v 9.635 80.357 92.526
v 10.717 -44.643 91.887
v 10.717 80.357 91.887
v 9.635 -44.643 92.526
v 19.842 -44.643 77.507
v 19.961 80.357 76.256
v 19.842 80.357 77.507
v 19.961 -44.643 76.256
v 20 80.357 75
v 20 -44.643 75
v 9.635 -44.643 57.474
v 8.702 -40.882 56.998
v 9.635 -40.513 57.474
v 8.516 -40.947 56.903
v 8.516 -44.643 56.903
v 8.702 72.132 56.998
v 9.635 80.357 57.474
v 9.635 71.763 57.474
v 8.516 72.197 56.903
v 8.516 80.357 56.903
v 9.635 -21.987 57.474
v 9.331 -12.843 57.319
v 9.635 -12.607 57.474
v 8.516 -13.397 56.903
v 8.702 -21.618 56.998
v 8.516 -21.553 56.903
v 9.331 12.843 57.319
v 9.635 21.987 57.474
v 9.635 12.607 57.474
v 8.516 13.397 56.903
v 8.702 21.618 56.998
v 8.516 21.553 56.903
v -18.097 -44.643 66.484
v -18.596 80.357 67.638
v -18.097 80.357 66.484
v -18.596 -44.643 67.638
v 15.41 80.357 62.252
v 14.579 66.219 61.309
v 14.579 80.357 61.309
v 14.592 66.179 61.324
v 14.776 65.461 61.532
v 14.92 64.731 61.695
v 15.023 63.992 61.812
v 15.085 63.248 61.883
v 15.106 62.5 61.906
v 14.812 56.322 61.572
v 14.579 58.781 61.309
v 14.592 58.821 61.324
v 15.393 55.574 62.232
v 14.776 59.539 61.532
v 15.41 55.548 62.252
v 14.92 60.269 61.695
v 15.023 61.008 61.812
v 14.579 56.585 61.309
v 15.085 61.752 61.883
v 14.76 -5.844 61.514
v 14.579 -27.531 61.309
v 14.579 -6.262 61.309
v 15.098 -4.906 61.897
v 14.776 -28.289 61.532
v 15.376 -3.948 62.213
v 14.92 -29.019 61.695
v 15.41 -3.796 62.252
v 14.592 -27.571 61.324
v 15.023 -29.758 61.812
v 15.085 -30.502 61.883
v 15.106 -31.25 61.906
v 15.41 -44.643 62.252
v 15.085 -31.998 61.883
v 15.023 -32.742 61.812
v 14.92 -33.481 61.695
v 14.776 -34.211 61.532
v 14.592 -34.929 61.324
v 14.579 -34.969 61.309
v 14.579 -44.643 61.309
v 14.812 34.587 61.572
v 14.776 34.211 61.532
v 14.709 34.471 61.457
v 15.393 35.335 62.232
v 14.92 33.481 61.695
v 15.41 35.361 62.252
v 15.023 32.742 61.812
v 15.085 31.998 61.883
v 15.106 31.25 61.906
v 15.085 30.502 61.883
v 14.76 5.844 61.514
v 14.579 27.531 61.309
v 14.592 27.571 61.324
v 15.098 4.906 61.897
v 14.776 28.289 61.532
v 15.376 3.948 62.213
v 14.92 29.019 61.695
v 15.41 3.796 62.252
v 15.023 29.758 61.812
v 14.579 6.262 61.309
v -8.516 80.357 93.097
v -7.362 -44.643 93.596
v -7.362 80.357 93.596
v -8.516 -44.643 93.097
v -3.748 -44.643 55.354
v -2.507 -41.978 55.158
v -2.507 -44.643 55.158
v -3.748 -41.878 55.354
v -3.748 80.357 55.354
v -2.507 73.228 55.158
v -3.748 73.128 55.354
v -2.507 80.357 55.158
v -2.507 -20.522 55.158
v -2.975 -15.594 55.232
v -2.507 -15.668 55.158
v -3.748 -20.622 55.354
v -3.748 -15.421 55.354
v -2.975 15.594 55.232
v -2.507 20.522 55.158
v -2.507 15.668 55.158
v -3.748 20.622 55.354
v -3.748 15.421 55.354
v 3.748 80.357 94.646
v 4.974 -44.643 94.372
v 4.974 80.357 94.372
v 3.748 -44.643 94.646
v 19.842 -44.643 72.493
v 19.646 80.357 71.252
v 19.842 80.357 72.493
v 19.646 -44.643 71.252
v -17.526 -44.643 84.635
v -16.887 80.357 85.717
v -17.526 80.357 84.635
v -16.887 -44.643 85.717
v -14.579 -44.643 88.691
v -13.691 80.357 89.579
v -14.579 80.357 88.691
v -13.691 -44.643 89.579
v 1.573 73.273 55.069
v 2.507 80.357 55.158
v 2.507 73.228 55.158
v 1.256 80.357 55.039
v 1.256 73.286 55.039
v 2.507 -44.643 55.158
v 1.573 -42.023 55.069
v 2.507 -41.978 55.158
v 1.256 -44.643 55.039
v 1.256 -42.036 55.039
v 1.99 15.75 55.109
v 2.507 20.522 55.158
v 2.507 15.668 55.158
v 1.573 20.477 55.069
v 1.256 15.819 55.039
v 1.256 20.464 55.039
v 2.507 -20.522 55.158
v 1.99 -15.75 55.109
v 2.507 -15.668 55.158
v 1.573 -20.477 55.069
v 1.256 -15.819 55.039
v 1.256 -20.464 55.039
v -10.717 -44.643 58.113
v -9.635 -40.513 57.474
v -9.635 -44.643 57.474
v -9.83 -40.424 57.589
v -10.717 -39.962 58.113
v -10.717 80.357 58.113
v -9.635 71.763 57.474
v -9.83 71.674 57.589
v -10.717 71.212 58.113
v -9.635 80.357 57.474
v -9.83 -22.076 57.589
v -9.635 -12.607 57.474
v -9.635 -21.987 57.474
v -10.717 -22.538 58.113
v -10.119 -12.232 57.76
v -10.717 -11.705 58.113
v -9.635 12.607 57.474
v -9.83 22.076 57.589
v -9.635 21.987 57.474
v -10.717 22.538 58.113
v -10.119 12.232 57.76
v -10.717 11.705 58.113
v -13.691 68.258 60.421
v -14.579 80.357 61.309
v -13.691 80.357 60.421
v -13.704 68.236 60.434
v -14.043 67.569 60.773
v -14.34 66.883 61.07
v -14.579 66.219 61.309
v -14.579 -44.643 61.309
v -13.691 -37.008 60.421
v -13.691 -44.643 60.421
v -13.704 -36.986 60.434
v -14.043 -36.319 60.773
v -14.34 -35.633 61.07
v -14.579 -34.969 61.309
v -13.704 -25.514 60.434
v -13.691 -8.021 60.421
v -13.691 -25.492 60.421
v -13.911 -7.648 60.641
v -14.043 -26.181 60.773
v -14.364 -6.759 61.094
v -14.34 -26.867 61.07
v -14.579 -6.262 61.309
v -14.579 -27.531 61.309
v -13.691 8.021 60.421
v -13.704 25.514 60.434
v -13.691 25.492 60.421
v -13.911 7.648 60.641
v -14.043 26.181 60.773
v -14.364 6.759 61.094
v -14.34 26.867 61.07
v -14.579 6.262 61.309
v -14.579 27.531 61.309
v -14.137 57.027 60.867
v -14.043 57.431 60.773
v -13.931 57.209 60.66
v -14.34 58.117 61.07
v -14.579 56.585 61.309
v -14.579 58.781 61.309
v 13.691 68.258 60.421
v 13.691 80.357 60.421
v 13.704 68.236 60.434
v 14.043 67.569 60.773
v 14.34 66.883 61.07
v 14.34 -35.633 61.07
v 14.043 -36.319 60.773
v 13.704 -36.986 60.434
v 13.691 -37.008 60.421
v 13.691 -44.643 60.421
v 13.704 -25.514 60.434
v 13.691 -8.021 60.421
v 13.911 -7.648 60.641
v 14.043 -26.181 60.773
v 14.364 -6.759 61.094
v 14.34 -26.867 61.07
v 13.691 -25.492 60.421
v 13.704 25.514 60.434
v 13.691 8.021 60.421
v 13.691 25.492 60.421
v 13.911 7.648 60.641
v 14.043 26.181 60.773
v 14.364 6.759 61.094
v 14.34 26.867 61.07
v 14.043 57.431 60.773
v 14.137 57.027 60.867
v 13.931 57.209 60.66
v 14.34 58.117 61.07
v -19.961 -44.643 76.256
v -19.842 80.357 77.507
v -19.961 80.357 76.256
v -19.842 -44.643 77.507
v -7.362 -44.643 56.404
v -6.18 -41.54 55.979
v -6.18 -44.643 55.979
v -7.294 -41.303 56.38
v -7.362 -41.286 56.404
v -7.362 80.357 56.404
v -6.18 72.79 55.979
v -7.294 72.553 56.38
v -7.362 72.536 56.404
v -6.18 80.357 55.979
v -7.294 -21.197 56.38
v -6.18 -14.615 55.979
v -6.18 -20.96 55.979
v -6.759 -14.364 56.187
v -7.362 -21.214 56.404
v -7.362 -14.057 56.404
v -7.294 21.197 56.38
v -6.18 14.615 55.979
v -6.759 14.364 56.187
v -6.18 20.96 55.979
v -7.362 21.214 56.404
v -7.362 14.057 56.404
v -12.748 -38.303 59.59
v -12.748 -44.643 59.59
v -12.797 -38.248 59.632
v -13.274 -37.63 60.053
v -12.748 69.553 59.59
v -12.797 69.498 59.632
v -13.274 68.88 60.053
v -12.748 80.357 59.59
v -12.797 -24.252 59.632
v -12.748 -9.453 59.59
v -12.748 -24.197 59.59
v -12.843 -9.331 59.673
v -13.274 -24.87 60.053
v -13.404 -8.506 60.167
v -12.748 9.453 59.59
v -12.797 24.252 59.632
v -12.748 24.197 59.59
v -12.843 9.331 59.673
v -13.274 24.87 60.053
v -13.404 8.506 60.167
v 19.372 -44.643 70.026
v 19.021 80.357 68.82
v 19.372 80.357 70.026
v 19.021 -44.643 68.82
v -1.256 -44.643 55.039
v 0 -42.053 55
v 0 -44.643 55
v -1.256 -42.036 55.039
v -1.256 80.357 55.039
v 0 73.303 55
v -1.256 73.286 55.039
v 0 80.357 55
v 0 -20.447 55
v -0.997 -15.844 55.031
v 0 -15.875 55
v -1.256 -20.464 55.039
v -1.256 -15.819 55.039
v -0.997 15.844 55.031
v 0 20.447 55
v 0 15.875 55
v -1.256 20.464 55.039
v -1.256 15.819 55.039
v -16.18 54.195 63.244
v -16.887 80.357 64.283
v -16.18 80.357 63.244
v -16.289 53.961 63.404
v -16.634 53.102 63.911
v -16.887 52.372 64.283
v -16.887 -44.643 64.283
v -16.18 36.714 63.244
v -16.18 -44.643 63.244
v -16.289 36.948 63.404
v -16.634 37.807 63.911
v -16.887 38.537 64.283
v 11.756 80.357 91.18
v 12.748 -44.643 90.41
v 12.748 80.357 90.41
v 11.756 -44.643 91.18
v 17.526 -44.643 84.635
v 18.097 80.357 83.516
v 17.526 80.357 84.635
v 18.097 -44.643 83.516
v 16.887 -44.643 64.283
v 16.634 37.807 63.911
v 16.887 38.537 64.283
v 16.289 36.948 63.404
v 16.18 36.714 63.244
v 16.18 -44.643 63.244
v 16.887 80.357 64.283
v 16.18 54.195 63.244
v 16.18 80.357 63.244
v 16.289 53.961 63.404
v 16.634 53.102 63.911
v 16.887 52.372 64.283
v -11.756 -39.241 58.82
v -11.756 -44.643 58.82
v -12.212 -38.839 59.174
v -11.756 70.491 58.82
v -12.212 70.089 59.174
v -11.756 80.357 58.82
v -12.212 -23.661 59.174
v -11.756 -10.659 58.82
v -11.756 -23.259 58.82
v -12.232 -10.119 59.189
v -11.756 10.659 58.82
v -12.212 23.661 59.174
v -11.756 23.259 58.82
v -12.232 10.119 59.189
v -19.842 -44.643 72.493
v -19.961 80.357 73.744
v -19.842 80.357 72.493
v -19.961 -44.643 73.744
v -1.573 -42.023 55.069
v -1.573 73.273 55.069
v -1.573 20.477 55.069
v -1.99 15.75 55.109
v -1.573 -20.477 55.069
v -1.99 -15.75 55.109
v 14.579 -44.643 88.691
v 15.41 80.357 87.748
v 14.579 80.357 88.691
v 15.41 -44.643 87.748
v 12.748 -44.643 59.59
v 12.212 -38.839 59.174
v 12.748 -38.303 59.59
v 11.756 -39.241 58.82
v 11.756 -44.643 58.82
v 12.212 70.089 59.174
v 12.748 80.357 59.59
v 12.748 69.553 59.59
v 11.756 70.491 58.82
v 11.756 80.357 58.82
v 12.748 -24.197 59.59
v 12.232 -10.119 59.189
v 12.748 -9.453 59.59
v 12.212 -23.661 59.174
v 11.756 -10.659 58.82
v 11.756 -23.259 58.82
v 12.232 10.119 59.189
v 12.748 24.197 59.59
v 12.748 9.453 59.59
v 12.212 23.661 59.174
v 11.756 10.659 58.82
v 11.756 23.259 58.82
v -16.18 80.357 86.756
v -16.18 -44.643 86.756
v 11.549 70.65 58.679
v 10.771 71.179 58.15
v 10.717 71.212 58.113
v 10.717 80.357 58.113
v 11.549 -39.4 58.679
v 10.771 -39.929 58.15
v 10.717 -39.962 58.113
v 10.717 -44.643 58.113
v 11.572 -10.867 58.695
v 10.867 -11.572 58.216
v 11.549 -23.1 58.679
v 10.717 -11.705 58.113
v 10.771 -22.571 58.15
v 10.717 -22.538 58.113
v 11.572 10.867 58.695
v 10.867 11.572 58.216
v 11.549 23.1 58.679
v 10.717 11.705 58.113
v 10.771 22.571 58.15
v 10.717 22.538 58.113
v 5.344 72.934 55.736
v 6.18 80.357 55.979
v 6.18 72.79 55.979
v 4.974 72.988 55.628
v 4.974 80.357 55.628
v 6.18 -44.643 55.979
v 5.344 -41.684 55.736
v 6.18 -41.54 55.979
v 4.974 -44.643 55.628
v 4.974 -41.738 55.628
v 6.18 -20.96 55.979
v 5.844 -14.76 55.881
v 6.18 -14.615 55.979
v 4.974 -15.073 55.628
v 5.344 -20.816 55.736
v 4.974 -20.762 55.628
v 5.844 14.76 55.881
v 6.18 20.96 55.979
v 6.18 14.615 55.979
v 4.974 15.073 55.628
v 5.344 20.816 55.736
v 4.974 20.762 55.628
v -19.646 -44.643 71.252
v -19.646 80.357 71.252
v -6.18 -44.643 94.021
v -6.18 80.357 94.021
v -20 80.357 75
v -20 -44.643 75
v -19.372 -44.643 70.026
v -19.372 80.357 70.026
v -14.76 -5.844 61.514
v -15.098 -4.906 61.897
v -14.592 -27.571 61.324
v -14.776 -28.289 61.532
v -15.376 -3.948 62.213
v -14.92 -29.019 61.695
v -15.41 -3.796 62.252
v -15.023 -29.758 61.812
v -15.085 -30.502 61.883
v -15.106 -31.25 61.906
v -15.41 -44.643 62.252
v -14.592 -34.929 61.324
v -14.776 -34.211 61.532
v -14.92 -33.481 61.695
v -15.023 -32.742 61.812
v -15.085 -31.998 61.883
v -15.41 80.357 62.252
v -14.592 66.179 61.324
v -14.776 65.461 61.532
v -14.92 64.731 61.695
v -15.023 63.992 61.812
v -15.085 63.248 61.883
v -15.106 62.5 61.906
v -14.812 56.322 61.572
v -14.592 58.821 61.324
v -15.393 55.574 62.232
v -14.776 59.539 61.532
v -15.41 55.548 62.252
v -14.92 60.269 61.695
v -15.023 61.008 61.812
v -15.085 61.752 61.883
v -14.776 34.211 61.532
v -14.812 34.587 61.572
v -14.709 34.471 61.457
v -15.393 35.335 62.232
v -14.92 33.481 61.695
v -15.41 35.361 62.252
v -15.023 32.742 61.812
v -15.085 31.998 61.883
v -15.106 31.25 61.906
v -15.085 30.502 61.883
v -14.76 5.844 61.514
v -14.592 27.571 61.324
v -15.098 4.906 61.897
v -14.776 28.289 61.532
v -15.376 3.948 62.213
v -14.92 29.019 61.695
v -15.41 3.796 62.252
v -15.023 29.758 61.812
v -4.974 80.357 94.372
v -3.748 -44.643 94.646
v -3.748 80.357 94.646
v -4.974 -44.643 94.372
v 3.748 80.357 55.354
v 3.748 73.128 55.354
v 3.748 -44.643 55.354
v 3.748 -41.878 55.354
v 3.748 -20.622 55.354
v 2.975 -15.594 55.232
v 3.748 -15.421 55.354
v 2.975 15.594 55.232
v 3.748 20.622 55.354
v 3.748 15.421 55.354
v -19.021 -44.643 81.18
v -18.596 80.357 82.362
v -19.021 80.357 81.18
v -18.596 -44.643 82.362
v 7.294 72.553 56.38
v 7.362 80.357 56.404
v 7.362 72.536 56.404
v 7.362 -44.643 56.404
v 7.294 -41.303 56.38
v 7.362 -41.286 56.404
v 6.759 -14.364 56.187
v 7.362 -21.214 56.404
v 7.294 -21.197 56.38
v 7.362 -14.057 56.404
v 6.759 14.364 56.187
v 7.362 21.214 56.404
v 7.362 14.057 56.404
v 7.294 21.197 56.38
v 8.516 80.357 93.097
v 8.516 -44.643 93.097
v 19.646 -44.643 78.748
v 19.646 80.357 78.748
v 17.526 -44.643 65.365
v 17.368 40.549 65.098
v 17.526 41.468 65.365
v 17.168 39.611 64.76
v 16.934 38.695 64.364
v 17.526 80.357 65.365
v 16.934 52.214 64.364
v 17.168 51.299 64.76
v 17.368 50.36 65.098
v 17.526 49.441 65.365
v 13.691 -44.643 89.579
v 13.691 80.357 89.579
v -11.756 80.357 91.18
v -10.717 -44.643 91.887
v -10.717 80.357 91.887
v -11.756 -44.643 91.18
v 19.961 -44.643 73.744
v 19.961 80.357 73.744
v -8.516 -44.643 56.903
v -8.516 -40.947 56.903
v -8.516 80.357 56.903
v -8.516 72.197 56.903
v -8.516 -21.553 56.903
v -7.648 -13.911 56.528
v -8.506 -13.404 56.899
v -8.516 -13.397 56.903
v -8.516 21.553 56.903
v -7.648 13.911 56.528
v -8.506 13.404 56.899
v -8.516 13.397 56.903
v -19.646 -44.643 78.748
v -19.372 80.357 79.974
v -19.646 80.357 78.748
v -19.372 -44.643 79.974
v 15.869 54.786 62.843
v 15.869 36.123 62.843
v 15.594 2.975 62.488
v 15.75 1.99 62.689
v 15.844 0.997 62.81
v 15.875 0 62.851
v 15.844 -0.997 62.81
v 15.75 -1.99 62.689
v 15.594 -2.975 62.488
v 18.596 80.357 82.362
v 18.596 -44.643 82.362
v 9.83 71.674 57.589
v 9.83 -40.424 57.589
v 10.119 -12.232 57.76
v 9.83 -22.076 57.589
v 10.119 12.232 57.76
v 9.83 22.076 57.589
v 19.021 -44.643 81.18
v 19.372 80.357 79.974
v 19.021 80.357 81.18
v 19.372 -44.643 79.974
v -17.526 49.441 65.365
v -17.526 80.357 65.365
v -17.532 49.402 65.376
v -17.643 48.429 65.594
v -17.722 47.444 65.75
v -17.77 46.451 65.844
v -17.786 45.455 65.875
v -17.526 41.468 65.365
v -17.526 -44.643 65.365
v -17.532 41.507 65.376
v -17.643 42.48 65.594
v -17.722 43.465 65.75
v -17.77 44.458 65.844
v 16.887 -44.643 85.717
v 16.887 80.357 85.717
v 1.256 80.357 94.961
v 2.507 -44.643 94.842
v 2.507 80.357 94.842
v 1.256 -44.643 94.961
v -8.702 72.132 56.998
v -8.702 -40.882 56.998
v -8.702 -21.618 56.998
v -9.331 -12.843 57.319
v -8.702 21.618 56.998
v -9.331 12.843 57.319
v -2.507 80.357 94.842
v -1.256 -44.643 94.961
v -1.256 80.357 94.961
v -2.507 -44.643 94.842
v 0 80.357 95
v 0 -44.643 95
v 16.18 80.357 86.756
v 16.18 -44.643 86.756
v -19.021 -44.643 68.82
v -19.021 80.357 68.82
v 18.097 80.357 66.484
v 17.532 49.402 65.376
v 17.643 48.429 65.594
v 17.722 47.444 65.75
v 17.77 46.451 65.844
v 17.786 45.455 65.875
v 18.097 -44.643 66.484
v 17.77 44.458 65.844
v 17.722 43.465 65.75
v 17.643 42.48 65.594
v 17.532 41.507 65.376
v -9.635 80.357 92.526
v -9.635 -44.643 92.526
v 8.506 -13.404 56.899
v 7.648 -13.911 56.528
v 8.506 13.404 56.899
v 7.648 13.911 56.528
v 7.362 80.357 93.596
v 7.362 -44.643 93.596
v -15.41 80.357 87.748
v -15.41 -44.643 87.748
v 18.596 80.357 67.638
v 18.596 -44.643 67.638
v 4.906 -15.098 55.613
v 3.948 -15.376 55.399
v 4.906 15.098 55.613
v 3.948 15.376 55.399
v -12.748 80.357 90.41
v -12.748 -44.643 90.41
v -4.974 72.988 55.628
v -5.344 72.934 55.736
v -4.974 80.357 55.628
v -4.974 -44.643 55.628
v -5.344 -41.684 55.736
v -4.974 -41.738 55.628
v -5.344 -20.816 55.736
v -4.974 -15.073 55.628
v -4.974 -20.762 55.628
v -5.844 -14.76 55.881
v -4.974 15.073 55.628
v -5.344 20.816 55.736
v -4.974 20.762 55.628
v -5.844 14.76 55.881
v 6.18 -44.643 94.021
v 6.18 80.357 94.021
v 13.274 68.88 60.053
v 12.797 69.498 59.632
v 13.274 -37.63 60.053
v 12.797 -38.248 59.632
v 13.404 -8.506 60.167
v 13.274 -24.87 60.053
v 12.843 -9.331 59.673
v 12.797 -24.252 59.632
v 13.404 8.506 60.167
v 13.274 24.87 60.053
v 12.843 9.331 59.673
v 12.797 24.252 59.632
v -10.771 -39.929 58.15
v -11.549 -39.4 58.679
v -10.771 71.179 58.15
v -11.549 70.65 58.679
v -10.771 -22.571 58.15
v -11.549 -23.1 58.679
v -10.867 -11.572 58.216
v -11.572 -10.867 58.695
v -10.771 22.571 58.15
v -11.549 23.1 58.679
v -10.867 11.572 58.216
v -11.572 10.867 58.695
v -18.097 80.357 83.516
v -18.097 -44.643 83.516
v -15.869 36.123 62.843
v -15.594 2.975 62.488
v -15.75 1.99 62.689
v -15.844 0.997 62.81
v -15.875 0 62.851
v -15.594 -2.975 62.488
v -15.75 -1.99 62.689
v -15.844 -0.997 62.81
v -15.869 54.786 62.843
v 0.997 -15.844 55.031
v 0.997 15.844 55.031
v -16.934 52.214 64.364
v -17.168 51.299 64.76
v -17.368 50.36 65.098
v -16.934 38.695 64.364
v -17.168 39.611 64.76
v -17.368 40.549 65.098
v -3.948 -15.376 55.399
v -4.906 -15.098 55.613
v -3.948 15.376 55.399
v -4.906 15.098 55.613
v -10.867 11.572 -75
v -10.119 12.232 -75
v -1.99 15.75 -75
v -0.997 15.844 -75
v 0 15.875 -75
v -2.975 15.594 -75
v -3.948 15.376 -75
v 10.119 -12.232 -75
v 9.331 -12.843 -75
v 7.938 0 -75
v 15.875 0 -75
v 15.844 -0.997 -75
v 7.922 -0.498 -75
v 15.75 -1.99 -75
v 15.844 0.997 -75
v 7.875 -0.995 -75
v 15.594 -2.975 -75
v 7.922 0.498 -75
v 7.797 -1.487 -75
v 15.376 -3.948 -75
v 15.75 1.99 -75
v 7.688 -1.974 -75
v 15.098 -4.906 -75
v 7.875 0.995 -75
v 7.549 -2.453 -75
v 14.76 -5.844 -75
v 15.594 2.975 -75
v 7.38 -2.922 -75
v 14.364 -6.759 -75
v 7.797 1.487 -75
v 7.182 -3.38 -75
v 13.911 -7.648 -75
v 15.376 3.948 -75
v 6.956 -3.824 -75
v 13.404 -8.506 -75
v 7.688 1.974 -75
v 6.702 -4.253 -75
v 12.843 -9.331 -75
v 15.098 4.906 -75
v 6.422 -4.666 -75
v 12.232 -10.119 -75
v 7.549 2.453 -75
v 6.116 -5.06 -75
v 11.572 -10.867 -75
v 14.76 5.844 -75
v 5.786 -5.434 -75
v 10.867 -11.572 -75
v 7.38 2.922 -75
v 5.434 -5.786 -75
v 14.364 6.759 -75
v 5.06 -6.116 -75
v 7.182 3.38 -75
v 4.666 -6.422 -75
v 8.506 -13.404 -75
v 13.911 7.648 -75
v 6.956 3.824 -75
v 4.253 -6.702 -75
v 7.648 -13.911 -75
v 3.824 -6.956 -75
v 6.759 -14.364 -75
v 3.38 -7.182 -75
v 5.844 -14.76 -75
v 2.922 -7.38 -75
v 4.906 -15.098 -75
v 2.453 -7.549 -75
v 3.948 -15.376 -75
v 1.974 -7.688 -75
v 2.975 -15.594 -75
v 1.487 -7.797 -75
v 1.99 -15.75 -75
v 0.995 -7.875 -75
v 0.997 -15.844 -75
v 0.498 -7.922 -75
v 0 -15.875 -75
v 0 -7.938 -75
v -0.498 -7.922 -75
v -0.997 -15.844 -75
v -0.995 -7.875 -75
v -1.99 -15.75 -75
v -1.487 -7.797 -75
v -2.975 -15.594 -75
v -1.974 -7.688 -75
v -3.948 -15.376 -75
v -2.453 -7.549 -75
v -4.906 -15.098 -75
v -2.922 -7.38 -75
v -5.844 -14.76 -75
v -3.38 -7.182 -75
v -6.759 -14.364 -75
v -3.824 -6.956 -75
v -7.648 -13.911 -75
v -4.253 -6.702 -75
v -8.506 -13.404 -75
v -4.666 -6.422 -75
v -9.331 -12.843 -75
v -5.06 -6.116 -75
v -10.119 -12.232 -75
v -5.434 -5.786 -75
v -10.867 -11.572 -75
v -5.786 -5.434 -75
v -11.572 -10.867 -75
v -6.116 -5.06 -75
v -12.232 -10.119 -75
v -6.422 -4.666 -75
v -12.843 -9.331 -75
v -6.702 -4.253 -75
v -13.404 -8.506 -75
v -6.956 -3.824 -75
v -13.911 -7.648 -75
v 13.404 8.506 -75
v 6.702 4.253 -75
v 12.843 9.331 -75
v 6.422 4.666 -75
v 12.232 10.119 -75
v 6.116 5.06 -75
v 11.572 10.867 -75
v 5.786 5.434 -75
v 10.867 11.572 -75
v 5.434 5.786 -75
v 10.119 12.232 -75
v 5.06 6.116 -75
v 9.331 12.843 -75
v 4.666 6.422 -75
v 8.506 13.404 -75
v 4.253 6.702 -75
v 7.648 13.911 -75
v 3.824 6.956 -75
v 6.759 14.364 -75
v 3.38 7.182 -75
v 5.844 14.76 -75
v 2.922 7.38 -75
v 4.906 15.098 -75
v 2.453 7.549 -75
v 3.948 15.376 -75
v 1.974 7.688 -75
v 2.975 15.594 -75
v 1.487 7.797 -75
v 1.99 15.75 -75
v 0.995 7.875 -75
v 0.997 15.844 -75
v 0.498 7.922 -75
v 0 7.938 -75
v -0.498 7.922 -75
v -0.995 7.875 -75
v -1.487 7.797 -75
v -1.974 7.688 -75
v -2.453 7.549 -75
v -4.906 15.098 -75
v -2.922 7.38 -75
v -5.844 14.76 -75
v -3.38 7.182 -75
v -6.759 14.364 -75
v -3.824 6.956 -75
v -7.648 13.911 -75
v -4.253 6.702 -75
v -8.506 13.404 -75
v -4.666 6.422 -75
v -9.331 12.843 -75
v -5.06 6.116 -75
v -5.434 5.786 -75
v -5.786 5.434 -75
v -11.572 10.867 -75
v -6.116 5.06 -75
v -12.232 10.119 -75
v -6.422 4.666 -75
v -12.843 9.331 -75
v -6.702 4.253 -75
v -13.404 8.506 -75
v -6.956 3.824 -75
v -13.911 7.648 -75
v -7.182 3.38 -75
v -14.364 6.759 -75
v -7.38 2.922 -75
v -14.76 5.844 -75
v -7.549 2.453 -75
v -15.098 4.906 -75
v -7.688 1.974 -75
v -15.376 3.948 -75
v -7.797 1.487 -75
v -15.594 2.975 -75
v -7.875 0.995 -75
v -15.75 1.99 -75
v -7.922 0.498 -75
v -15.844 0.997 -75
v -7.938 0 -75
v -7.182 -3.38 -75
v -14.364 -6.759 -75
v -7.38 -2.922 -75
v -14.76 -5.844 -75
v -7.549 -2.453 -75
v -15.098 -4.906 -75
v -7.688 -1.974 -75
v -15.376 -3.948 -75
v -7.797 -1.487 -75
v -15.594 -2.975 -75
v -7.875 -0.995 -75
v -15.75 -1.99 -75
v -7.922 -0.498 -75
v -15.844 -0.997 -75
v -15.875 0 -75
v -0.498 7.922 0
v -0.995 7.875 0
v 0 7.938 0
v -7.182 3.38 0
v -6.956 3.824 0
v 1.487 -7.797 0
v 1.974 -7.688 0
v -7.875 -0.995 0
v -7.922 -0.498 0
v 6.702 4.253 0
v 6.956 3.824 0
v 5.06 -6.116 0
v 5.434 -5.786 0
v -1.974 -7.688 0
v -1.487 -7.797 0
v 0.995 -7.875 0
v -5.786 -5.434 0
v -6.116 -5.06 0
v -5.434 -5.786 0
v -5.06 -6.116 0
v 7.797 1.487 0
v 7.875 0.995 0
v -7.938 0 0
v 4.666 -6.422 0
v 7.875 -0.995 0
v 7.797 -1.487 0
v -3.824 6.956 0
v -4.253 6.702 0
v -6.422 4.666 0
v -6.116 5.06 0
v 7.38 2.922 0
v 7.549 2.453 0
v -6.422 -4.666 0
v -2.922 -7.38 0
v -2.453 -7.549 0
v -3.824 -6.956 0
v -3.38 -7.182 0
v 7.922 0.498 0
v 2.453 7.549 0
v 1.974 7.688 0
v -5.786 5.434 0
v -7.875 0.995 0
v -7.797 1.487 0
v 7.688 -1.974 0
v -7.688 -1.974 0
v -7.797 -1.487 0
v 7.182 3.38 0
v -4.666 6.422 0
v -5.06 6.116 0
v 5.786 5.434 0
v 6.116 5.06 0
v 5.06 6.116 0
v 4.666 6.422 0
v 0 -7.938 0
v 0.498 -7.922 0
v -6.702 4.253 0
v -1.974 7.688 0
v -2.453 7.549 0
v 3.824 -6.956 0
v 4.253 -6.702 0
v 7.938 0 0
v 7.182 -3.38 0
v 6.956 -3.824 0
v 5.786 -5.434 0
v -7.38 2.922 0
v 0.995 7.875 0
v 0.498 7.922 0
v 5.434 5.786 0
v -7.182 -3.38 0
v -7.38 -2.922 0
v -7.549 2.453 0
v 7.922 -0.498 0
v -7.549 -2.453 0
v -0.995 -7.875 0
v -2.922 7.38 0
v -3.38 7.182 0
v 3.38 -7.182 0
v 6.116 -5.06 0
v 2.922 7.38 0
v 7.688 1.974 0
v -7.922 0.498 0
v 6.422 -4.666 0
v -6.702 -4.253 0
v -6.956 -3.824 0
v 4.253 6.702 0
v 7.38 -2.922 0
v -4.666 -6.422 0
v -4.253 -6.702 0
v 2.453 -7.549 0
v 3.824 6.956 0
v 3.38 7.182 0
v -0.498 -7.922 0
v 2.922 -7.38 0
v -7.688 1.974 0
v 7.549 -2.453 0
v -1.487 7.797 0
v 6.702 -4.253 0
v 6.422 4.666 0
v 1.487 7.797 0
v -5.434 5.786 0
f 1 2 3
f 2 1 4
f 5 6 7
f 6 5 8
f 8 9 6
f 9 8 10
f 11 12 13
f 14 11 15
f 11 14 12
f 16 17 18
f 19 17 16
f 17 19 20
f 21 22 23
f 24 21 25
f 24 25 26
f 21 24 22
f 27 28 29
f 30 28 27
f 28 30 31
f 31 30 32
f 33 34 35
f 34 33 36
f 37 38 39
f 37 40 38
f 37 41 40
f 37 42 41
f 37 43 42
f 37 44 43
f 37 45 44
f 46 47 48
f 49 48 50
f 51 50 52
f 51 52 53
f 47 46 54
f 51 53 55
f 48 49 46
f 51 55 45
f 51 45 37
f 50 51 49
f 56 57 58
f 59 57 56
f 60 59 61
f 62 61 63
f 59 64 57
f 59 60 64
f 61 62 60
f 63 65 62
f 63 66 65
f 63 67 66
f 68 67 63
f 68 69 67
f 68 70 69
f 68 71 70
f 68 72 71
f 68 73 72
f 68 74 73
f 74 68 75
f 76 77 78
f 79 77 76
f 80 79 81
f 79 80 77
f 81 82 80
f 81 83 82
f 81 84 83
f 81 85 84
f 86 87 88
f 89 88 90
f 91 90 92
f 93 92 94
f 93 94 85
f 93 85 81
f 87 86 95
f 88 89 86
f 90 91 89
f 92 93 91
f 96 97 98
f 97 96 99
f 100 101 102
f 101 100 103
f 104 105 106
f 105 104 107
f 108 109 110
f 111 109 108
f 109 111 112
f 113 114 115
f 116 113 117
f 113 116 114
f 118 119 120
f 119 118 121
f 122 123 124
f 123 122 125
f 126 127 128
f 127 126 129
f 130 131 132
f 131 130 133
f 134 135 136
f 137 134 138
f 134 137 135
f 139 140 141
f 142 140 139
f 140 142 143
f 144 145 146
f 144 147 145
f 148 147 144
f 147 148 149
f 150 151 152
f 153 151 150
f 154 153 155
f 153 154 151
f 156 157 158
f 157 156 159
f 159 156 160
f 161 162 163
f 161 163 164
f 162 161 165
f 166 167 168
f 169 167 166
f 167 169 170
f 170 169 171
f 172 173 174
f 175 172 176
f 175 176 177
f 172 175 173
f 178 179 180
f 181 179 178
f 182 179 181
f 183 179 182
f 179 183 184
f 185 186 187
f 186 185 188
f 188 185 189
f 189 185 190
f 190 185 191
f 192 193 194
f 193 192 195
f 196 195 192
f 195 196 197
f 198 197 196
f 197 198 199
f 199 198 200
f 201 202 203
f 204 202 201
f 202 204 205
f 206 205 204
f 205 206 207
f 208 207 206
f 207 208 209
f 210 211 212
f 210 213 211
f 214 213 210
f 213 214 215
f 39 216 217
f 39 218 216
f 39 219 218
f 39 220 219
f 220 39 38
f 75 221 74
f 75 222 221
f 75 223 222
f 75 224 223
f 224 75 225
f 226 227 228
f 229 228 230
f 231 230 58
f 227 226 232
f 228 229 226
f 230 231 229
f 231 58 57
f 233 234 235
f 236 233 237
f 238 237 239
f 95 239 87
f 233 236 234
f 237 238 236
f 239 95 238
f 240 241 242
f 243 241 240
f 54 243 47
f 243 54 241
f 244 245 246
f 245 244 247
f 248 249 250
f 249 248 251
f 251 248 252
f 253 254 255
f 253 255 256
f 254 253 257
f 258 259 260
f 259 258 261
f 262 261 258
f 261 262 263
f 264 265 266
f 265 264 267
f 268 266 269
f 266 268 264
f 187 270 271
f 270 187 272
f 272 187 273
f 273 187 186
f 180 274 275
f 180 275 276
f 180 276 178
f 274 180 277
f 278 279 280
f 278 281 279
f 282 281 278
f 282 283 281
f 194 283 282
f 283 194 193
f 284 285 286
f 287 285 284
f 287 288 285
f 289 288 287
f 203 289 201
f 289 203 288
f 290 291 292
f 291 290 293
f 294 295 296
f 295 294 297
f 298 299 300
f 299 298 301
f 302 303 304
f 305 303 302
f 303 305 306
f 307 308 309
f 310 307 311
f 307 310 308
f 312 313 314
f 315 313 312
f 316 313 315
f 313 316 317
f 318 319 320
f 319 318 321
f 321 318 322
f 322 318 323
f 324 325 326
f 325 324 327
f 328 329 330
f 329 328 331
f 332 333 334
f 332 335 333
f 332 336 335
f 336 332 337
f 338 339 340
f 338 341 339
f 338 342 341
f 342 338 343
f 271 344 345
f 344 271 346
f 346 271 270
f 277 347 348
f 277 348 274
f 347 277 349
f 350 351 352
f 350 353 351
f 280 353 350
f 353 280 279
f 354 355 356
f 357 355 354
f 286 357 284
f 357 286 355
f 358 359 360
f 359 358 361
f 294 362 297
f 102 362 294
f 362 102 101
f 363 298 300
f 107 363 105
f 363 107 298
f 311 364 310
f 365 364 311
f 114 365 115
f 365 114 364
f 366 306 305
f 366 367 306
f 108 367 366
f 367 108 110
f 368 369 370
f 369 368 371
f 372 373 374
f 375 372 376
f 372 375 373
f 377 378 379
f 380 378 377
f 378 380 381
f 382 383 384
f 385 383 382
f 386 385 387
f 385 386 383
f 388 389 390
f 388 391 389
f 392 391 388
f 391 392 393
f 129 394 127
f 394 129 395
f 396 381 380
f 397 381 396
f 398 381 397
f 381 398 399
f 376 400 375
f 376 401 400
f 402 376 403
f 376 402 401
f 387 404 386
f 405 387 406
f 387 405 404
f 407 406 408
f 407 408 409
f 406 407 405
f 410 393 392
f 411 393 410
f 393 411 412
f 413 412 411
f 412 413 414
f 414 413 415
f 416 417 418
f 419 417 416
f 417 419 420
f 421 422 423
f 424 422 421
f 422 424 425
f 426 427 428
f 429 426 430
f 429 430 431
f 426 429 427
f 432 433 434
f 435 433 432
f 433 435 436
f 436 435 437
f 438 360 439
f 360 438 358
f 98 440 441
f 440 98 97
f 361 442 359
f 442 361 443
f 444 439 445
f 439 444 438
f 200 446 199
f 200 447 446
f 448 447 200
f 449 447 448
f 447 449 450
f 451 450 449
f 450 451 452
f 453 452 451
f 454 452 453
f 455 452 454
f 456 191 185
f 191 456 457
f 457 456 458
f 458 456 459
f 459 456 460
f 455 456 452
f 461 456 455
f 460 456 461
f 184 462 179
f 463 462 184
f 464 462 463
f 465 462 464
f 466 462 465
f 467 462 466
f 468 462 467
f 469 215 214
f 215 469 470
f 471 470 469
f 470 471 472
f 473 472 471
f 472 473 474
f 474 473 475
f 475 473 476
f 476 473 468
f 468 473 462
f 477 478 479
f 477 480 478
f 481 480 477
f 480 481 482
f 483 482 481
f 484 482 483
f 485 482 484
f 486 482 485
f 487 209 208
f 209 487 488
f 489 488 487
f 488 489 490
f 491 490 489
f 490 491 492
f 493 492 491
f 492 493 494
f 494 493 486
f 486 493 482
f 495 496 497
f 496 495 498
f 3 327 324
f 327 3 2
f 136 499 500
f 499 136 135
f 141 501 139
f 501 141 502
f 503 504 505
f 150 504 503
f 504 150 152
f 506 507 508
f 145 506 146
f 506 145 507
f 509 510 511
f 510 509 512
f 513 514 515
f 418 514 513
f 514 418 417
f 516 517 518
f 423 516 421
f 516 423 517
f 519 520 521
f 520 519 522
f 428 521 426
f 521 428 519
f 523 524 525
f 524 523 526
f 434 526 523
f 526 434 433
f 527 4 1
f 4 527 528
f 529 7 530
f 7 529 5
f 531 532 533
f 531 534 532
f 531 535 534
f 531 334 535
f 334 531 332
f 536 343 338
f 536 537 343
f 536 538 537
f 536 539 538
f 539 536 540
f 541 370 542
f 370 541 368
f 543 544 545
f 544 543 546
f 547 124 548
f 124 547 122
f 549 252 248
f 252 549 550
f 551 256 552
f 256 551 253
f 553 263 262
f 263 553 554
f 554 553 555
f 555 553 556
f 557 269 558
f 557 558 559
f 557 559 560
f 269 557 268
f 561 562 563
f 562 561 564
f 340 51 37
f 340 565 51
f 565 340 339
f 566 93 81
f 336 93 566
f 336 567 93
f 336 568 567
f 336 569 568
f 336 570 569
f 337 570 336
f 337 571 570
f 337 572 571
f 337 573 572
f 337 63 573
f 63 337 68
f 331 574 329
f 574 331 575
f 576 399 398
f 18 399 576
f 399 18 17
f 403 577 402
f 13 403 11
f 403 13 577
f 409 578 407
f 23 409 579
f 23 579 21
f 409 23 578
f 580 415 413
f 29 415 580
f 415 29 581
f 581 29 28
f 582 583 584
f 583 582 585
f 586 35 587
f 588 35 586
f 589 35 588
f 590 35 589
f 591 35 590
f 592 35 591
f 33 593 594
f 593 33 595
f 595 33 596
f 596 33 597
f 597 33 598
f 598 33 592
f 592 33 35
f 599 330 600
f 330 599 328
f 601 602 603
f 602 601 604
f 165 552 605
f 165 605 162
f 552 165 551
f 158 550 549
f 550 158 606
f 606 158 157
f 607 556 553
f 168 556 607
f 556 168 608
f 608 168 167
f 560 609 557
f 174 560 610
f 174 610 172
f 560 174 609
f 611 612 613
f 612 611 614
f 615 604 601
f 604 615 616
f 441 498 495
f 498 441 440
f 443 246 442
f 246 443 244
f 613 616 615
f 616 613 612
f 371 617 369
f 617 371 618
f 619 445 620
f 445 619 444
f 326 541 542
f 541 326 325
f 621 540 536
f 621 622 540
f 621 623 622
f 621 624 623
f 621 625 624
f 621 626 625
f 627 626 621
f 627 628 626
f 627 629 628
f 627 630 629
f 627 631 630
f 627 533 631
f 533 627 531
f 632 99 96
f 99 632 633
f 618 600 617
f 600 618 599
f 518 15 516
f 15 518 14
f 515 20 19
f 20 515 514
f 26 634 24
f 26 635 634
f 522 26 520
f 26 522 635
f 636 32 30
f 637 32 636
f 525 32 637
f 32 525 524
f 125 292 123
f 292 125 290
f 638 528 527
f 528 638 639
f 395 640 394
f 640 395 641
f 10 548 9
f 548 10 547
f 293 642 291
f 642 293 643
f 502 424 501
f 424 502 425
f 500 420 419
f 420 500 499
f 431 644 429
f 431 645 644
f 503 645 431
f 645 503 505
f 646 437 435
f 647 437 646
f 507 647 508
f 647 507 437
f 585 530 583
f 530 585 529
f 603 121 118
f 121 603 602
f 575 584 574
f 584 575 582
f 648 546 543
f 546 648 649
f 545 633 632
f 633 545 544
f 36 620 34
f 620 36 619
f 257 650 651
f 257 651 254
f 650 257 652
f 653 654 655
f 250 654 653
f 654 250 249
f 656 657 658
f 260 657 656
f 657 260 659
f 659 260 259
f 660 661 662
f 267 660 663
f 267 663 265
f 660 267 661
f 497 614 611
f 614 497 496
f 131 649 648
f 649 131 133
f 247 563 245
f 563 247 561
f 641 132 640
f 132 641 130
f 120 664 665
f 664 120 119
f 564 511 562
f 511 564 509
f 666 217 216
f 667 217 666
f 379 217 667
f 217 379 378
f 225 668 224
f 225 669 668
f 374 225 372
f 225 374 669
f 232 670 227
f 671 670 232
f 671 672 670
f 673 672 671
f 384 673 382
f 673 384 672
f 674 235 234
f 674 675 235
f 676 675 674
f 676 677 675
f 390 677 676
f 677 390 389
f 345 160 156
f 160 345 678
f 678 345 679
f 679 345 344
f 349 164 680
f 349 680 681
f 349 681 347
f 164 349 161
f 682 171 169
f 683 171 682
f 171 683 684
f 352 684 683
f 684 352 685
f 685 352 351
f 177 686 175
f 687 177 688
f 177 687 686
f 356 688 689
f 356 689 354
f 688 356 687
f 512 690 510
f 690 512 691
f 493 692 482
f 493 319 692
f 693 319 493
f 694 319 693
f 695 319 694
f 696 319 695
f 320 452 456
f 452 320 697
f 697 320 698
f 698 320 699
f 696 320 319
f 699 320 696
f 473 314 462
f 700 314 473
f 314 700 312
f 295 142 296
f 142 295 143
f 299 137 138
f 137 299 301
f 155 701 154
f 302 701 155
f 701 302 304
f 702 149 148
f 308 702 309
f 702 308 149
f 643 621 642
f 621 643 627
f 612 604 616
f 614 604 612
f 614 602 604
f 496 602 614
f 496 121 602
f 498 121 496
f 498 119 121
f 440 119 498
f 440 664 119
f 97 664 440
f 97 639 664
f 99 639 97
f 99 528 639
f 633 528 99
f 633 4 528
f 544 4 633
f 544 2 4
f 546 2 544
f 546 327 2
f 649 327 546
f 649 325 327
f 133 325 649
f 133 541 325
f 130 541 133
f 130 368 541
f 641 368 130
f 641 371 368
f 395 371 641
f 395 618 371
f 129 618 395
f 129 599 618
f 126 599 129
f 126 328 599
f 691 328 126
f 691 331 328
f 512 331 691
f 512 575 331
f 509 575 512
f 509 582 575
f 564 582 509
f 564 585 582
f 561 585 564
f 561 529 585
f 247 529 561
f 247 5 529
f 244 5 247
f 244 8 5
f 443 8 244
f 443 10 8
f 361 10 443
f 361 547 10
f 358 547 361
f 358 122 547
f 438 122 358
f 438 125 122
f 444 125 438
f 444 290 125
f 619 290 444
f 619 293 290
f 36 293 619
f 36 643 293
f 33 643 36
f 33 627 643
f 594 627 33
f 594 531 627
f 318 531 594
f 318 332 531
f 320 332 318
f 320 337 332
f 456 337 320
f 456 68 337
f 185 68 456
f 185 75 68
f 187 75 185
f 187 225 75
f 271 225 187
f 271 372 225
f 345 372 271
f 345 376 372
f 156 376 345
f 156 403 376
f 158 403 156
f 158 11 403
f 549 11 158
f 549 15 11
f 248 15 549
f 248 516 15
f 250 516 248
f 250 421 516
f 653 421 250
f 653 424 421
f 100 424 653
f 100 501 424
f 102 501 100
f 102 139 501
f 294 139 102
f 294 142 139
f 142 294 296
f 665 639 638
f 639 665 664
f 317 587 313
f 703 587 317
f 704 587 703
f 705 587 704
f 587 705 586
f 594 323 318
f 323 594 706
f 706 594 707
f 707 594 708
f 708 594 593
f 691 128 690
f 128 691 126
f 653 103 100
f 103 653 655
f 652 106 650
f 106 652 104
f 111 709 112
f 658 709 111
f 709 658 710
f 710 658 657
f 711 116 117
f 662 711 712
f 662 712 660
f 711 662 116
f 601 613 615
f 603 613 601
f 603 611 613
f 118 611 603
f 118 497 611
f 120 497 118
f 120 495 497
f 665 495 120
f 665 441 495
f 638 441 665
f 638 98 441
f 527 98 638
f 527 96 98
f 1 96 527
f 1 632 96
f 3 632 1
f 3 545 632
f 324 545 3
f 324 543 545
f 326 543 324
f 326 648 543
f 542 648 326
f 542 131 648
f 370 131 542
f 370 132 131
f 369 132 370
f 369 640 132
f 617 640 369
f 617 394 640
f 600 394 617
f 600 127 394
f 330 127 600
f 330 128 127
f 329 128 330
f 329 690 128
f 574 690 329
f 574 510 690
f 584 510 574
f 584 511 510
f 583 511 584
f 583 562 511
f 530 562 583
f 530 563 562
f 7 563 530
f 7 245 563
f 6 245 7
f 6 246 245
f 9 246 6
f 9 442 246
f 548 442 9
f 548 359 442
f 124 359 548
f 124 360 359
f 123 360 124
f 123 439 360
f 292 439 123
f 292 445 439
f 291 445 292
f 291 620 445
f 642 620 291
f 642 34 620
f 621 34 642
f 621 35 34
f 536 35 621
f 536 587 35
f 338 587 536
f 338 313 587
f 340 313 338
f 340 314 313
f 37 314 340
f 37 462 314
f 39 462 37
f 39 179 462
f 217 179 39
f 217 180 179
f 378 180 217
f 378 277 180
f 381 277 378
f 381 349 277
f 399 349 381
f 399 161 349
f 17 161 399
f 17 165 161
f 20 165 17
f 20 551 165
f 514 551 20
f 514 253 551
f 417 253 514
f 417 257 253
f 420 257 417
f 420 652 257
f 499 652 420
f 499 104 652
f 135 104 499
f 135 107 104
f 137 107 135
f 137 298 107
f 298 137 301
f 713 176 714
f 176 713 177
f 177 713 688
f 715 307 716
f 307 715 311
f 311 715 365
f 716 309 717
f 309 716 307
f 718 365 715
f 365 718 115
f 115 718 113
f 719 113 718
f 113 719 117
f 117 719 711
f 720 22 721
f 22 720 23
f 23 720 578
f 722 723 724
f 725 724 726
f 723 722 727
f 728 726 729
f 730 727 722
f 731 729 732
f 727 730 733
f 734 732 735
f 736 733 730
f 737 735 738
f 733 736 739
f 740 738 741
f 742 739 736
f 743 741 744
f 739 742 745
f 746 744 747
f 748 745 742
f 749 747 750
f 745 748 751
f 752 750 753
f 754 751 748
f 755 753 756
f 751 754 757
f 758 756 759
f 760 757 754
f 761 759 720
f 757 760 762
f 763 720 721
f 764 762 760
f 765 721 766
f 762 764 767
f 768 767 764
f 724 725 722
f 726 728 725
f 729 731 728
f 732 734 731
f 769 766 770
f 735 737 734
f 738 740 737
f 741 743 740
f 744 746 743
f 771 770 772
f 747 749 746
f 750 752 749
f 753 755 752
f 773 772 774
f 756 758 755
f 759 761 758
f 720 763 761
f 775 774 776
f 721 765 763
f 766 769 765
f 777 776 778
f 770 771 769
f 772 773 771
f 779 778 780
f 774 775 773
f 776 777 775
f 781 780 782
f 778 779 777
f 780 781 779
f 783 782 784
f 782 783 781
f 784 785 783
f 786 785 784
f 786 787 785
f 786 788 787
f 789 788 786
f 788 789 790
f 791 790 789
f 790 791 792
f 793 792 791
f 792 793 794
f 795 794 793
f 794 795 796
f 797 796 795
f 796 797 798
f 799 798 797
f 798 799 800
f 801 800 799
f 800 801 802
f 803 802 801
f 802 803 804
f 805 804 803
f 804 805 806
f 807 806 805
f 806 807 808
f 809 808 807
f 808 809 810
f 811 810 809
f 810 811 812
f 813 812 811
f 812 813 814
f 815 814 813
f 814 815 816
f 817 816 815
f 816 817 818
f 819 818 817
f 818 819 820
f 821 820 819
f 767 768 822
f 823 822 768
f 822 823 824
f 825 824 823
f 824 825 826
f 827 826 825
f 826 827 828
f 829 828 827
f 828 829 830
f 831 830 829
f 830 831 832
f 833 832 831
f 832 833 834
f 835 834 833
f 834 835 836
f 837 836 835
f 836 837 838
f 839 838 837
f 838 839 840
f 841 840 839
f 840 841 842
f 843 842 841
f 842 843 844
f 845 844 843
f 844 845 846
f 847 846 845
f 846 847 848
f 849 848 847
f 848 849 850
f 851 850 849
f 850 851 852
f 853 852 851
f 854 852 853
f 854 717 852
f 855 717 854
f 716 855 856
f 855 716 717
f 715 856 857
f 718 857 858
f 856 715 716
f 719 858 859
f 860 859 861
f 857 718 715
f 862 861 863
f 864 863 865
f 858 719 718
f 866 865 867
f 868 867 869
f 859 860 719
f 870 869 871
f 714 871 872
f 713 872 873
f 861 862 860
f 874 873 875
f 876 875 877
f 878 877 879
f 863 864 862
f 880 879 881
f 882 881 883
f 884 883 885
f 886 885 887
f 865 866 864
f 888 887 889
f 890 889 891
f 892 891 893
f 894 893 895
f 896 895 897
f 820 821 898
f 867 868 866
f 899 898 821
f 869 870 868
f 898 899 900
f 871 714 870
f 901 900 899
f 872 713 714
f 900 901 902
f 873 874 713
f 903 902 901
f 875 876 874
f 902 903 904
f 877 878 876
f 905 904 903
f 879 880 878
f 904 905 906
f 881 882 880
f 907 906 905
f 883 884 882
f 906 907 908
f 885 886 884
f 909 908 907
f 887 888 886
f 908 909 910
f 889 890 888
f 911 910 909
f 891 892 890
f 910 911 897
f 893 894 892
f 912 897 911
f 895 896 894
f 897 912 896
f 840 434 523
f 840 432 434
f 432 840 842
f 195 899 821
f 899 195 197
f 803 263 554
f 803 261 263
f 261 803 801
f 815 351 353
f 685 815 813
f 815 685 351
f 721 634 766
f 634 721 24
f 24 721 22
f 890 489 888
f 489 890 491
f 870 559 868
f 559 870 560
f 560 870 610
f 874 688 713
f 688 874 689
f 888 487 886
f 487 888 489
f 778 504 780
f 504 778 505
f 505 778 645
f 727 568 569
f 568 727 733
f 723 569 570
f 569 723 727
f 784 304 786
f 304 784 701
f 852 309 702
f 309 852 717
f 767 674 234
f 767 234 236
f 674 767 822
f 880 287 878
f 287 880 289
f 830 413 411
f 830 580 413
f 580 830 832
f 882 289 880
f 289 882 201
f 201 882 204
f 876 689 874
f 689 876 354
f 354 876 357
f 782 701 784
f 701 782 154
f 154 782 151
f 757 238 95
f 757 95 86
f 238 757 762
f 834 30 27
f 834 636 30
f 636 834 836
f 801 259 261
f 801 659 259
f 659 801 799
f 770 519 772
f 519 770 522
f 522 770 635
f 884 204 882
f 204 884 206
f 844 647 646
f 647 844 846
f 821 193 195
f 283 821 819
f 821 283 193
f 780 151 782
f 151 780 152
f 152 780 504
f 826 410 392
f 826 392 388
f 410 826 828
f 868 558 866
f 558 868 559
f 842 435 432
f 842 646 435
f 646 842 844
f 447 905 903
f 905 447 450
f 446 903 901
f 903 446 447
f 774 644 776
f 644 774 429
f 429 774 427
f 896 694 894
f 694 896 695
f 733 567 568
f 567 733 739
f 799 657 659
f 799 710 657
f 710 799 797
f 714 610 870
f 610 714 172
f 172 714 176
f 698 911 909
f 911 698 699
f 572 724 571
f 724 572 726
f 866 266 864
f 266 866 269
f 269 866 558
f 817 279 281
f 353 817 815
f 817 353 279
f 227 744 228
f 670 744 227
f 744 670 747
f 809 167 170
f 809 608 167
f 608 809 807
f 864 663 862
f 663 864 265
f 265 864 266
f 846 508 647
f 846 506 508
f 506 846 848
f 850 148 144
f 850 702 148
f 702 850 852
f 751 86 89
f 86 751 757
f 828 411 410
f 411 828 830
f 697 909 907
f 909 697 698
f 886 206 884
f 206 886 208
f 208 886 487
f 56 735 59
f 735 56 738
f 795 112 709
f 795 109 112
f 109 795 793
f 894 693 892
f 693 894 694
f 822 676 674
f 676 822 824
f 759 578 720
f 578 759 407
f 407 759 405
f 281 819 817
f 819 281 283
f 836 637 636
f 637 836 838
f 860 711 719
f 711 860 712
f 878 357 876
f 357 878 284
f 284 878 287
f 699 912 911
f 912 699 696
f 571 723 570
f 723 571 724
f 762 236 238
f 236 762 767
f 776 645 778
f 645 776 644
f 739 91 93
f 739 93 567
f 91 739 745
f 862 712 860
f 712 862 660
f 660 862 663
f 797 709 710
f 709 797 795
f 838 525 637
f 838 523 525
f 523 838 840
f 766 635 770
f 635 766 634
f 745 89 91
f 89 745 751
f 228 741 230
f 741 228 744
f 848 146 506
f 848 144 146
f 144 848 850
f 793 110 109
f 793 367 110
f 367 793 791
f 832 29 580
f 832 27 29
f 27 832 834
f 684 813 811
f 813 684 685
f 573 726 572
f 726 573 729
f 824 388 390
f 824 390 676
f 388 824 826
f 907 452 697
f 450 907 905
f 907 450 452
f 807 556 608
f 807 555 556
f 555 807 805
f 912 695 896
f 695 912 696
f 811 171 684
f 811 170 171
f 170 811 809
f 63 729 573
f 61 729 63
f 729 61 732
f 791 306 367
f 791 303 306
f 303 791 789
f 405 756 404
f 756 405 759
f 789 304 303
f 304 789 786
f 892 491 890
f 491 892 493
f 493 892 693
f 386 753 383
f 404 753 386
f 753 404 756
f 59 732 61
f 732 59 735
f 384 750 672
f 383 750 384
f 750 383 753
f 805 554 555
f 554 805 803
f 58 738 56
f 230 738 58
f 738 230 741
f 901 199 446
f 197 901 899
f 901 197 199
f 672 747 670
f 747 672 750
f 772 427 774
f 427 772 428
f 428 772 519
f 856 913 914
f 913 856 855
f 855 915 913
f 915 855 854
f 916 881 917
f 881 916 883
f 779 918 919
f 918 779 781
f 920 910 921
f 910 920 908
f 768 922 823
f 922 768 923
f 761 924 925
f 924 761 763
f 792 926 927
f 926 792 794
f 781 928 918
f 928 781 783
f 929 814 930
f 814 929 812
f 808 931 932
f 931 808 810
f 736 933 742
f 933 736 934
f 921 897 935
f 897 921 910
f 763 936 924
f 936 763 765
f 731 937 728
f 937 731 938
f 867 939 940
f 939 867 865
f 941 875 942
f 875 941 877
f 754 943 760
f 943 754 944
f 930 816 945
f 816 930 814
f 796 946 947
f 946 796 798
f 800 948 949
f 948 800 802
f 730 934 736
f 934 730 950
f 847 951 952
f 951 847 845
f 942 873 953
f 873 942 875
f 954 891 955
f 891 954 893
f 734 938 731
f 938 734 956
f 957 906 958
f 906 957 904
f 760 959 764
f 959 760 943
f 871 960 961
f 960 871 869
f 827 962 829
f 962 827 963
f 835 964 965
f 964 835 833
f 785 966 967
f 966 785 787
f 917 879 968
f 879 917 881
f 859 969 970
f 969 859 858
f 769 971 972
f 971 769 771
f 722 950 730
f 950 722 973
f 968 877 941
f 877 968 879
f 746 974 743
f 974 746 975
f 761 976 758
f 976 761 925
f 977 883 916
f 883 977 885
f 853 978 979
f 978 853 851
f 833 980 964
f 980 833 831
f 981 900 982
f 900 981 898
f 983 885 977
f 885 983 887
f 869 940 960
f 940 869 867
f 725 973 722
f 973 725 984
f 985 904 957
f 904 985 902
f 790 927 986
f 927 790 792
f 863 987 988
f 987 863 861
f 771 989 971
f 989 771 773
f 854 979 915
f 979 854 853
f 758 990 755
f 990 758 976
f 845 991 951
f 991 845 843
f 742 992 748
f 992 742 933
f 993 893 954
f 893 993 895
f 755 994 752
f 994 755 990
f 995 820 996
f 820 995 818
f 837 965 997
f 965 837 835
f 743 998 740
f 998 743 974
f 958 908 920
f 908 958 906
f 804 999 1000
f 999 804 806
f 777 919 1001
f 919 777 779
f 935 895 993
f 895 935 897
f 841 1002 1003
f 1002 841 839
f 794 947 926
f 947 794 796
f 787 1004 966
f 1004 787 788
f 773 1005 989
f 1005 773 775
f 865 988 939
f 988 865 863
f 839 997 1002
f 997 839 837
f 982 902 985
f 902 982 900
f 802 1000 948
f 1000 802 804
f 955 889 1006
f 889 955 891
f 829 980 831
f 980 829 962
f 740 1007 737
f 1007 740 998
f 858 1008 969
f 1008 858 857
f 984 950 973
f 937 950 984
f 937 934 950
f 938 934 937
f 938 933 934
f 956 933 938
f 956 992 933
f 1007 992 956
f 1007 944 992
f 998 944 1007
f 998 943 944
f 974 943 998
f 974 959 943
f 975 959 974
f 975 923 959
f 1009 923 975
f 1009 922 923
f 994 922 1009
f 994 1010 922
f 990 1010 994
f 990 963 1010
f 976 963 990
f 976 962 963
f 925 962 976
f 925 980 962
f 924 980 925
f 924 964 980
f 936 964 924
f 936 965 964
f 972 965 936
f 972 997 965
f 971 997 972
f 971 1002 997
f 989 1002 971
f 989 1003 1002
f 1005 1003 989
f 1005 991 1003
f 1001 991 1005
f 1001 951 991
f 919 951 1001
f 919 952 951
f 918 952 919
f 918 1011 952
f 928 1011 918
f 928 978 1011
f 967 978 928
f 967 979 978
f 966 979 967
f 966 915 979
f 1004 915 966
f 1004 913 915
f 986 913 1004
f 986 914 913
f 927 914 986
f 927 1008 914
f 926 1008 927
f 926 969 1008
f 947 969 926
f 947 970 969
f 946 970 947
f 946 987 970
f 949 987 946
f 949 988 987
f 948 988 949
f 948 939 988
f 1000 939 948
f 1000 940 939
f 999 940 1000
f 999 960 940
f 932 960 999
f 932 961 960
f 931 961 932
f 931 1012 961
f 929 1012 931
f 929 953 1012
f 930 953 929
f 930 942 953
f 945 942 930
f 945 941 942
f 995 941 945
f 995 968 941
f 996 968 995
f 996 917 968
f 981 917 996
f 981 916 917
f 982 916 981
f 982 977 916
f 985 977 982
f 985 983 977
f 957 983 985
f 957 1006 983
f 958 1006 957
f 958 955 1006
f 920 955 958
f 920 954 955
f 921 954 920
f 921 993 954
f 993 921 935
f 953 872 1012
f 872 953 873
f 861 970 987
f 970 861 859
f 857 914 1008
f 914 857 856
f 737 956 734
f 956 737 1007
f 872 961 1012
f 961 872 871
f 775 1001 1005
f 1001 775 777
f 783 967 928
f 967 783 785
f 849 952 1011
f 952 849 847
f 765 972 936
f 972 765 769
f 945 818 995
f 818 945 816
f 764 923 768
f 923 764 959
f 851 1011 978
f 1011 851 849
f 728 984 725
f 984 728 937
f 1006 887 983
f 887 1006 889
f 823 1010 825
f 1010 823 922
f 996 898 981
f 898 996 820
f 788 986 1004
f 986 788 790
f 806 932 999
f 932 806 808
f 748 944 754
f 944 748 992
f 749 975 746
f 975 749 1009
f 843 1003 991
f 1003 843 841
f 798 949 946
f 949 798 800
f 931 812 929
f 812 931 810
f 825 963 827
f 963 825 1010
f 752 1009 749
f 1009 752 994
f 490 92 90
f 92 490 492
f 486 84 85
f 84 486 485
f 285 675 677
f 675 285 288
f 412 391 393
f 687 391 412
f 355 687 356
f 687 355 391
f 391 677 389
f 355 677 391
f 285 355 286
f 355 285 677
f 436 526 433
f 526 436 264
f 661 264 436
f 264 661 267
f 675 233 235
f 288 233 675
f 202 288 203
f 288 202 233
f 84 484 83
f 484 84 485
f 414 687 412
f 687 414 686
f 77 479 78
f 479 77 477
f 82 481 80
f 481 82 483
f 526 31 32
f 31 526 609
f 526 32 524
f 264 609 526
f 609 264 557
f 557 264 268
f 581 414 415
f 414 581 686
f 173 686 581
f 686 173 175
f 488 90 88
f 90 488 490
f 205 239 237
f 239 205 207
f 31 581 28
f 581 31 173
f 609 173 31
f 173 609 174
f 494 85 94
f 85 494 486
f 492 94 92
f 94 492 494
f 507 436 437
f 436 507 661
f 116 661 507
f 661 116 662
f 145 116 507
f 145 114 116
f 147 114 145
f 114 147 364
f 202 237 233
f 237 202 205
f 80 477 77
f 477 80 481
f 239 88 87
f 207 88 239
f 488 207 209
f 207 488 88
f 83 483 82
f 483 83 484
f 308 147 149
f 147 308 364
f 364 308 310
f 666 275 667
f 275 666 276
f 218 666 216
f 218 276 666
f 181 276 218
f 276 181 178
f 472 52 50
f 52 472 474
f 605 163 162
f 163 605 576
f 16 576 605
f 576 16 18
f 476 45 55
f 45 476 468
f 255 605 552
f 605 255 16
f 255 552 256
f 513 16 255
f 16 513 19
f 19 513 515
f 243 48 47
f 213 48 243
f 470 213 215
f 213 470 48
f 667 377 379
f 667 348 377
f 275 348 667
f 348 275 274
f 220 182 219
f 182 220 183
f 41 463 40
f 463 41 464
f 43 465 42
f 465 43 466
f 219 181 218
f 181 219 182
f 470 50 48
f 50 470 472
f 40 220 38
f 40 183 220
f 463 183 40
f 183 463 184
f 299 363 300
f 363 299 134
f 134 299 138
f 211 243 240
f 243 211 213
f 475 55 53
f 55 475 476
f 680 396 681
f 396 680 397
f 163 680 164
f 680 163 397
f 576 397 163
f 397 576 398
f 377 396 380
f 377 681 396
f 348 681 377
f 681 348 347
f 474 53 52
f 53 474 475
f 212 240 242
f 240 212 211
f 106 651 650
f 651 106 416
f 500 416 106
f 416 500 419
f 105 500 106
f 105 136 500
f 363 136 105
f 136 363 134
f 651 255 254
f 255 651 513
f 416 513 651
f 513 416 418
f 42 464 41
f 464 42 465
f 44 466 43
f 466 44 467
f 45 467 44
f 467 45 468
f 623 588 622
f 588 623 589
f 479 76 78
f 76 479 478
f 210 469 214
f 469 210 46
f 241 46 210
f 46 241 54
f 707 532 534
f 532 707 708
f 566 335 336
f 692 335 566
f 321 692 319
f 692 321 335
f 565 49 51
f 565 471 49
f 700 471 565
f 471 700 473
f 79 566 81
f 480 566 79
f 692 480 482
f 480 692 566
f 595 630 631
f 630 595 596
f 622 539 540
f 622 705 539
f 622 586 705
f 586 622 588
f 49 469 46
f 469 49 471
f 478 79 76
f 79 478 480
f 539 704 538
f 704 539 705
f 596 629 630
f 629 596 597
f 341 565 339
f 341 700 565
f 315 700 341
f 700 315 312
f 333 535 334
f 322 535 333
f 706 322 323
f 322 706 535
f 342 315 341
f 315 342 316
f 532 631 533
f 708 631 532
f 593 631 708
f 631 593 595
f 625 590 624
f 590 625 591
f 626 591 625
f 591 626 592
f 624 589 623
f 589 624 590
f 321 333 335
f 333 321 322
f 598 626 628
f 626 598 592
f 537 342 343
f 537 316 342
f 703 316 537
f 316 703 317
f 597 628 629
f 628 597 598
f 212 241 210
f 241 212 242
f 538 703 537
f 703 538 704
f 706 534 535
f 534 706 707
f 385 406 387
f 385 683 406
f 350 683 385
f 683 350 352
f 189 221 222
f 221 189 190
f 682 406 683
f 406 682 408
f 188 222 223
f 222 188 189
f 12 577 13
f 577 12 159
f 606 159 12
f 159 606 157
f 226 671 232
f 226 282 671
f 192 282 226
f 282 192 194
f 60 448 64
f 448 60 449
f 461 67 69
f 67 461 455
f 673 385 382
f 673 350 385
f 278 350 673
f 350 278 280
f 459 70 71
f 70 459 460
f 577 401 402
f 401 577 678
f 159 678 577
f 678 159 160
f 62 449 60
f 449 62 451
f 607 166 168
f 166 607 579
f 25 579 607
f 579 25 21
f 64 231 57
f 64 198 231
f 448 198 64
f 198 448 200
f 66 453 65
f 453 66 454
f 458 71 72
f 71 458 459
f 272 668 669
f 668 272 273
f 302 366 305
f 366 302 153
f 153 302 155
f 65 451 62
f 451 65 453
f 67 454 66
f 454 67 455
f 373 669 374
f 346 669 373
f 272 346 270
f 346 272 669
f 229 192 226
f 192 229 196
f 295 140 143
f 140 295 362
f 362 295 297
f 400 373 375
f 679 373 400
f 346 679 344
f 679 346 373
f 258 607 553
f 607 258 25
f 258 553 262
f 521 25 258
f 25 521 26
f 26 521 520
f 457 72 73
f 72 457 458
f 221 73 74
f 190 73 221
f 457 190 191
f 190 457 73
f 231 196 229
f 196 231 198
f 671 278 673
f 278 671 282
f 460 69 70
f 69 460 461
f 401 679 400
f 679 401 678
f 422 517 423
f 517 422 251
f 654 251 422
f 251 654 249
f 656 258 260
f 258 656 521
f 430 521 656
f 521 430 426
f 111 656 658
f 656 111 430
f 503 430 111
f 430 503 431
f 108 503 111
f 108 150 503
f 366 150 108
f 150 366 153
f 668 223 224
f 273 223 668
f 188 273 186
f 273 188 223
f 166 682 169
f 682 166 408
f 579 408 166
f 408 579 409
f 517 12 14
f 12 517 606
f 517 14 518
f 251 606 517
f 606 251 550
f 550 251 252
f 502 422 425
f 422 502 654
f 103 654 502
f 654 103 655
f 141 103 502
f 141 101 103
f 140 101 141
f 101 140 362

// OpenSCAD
/*
    Textbox
    variable_name = value;
    Dropdown box
    Numbers
    variable_name = value; // [0,1,2,3,4]
    Text
    variable_name = value; // [yes,no]
    Labeled value
    variable_name = value; // [10:S,20:M,30:L]
    Slider or range
    max only (min is zero)
    variable_name = value; // [40]
    min and max
    variable_name = value; // [1:10]
    min, step, max
    variable_name = value; // [1:0.5:10]
*/

//width of shifter  
width=125;
//diameter of shifter  
diameter=20;
//height of shifter  
height=150;
//shifter thread size  [3/8"=9.525   7/16"=11.1125  1/2"=12.7    9/16"=14.2875 ] 
hole=7.9375;



difference(){
    union(){
        
     translate([0,width/7,height/2]){
           rotate(a=90, v=[1,0,0] , $fn=100){
           cylinder(width,diameter,diameter, center=true);}
           } 
           
           translate([0,0,0]){
           rotate(a=90, v=[0,0,1] , $fn=100){
           cylinder(height,2*hole,2*hole, center=true);}
           } 
           
   
       }         
    
    union(){ 
        
          translate([0,0,-height/2]){
           rotate(a=90, v=[0,0,1] , $fn=100){
           cylinder(height,hole,hole,       center=true);}
           } 
           
           translate([0,width/4,height/3]){
           rotate(a=90, v=[0,1,0] , $fn=100){
           cylinder(height,1.5*hole,1.5*hole, center=true);}
           } 
            
           translate([0,width/2,height/3]){
           rotate(a=90, v=[0,1,0] , $fn=100){
           cylinder(height,1.5*hole,1.5*hole, center=true);}
           } 
           
           translate([0,width/2.75,height/3]){
           rotate(a=90, v=[0,1,0] , $fn=100){
           cylinder(height,2*hole,2*hole, center=true);}
           } 
           
           translate([0,-width/4,height/3]){
           rotate(a=90, v=[0,1,0] , $fn=100){
           cylinder(height,1.5*hole,1.5*hole, center=true);}
           } 
    }
  }
   
